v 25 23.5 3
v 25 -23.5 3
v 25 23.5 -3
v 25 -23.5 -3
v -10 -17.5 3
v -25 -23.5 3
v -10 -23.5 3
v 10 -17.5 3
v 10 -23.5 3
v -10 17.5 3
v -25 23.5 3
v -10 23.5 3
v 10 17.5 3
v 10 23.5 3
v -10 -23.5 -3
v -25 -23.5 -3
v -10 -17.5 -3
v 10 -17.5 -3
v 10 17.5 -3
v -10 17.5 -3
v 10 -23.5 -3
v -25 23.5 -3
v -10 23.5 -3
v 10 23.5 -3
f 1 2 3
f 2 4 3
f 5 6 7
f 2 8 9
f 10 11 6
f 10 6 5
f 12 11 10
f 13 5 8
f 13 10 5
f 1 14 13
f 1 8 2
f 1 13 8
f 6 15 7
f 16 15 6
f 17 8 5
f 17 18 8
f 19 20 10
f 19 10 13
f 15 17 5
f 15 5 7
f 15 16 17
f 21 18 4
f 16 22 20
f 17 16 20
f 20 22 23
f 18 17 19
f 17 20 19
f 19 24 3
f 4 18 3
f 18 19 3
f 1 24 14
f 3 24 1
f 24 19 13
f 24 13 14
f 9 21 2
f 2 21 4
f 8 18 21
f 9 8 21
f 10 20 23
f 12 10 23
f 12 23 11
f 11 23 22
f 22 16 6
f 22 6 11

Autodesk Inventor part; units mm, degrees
ref_plane "YZ Plane" through (0, 0, 0) normal (1, 0, 0) x (0, 1, 0)
ref_plane "XZ Plane" through (0, 0, 0) normal (0, 1, 0) x (-1, 0, 0)
ref_plane "XY Plane" through (0, 0, 0) normal (0, 0, 1) x (1, 0, 0)
sketch "Эскиз1" plane through (0, 0, 0) normal (0, 0, 1) x (1, 0, 0)
  line L0 (25, -17.5) -> (-25, -17.5)
  line L1 (-25, -17.5) -> (-25, 17.5)
  line L2 (-25, 17.5) -> (25, 17.5)
  line L3 (25, 17.5) -> (25, -17.5)
  line L4 (25, -17.5) -> (-25, 17.5) construction
  line L5 (-25, -17.5) -> (25, 17.5) construction
  line L6 (-25, 17.5) -> (-10, 17.5)
  line L7 (-10, 17.5) -> (-10, 23.5)
  line L8 (-10, 23.5) -> (-25, 23.5)
  line L9 (-25, 23.5) -> (-25, 17.5)
  line L10 (25, 17.5) -> (10, 17.5)
  line L11 (10, 17.5) -> (10, 23.5)
  line L12 (10, 23.5) -> (25, 23.5)
  line L13 (25, 23.5) -> (25, 17.5)
  line L14 (-25, -17.5) -> (-10, -17.5)
  line L15 (-10, -17.5) -> (-10, -23.5)
  line L16 (-10, -23.5) -> (-25, -23.5)
  line L17 (-25, -23.5) -> (-25, -17.5)
  line L18 (25, -17.5) -> (10, -17.5)
  line L19 (10, -17.5) -> (10, -23.5)
  line L20 (10, -23.5) -> (25, -23.5)
  line L21 (25, -23.5) -> (25, -17.5)
  line L22 (0, 0) -> (0, 45.655) construction
  point P0 (-10, -17.5)
  point P1 (10, 17.5)
  dimension "d0" = 50
  dimension "d1" = 35
  dimension "d2" = 6
  dimension "d3" = 15
extrude "Выдавливание1" add sketch "Эскиз1" along normal mid plane 6
properties part number "Стойка_В5" material "По умолчанию1"
